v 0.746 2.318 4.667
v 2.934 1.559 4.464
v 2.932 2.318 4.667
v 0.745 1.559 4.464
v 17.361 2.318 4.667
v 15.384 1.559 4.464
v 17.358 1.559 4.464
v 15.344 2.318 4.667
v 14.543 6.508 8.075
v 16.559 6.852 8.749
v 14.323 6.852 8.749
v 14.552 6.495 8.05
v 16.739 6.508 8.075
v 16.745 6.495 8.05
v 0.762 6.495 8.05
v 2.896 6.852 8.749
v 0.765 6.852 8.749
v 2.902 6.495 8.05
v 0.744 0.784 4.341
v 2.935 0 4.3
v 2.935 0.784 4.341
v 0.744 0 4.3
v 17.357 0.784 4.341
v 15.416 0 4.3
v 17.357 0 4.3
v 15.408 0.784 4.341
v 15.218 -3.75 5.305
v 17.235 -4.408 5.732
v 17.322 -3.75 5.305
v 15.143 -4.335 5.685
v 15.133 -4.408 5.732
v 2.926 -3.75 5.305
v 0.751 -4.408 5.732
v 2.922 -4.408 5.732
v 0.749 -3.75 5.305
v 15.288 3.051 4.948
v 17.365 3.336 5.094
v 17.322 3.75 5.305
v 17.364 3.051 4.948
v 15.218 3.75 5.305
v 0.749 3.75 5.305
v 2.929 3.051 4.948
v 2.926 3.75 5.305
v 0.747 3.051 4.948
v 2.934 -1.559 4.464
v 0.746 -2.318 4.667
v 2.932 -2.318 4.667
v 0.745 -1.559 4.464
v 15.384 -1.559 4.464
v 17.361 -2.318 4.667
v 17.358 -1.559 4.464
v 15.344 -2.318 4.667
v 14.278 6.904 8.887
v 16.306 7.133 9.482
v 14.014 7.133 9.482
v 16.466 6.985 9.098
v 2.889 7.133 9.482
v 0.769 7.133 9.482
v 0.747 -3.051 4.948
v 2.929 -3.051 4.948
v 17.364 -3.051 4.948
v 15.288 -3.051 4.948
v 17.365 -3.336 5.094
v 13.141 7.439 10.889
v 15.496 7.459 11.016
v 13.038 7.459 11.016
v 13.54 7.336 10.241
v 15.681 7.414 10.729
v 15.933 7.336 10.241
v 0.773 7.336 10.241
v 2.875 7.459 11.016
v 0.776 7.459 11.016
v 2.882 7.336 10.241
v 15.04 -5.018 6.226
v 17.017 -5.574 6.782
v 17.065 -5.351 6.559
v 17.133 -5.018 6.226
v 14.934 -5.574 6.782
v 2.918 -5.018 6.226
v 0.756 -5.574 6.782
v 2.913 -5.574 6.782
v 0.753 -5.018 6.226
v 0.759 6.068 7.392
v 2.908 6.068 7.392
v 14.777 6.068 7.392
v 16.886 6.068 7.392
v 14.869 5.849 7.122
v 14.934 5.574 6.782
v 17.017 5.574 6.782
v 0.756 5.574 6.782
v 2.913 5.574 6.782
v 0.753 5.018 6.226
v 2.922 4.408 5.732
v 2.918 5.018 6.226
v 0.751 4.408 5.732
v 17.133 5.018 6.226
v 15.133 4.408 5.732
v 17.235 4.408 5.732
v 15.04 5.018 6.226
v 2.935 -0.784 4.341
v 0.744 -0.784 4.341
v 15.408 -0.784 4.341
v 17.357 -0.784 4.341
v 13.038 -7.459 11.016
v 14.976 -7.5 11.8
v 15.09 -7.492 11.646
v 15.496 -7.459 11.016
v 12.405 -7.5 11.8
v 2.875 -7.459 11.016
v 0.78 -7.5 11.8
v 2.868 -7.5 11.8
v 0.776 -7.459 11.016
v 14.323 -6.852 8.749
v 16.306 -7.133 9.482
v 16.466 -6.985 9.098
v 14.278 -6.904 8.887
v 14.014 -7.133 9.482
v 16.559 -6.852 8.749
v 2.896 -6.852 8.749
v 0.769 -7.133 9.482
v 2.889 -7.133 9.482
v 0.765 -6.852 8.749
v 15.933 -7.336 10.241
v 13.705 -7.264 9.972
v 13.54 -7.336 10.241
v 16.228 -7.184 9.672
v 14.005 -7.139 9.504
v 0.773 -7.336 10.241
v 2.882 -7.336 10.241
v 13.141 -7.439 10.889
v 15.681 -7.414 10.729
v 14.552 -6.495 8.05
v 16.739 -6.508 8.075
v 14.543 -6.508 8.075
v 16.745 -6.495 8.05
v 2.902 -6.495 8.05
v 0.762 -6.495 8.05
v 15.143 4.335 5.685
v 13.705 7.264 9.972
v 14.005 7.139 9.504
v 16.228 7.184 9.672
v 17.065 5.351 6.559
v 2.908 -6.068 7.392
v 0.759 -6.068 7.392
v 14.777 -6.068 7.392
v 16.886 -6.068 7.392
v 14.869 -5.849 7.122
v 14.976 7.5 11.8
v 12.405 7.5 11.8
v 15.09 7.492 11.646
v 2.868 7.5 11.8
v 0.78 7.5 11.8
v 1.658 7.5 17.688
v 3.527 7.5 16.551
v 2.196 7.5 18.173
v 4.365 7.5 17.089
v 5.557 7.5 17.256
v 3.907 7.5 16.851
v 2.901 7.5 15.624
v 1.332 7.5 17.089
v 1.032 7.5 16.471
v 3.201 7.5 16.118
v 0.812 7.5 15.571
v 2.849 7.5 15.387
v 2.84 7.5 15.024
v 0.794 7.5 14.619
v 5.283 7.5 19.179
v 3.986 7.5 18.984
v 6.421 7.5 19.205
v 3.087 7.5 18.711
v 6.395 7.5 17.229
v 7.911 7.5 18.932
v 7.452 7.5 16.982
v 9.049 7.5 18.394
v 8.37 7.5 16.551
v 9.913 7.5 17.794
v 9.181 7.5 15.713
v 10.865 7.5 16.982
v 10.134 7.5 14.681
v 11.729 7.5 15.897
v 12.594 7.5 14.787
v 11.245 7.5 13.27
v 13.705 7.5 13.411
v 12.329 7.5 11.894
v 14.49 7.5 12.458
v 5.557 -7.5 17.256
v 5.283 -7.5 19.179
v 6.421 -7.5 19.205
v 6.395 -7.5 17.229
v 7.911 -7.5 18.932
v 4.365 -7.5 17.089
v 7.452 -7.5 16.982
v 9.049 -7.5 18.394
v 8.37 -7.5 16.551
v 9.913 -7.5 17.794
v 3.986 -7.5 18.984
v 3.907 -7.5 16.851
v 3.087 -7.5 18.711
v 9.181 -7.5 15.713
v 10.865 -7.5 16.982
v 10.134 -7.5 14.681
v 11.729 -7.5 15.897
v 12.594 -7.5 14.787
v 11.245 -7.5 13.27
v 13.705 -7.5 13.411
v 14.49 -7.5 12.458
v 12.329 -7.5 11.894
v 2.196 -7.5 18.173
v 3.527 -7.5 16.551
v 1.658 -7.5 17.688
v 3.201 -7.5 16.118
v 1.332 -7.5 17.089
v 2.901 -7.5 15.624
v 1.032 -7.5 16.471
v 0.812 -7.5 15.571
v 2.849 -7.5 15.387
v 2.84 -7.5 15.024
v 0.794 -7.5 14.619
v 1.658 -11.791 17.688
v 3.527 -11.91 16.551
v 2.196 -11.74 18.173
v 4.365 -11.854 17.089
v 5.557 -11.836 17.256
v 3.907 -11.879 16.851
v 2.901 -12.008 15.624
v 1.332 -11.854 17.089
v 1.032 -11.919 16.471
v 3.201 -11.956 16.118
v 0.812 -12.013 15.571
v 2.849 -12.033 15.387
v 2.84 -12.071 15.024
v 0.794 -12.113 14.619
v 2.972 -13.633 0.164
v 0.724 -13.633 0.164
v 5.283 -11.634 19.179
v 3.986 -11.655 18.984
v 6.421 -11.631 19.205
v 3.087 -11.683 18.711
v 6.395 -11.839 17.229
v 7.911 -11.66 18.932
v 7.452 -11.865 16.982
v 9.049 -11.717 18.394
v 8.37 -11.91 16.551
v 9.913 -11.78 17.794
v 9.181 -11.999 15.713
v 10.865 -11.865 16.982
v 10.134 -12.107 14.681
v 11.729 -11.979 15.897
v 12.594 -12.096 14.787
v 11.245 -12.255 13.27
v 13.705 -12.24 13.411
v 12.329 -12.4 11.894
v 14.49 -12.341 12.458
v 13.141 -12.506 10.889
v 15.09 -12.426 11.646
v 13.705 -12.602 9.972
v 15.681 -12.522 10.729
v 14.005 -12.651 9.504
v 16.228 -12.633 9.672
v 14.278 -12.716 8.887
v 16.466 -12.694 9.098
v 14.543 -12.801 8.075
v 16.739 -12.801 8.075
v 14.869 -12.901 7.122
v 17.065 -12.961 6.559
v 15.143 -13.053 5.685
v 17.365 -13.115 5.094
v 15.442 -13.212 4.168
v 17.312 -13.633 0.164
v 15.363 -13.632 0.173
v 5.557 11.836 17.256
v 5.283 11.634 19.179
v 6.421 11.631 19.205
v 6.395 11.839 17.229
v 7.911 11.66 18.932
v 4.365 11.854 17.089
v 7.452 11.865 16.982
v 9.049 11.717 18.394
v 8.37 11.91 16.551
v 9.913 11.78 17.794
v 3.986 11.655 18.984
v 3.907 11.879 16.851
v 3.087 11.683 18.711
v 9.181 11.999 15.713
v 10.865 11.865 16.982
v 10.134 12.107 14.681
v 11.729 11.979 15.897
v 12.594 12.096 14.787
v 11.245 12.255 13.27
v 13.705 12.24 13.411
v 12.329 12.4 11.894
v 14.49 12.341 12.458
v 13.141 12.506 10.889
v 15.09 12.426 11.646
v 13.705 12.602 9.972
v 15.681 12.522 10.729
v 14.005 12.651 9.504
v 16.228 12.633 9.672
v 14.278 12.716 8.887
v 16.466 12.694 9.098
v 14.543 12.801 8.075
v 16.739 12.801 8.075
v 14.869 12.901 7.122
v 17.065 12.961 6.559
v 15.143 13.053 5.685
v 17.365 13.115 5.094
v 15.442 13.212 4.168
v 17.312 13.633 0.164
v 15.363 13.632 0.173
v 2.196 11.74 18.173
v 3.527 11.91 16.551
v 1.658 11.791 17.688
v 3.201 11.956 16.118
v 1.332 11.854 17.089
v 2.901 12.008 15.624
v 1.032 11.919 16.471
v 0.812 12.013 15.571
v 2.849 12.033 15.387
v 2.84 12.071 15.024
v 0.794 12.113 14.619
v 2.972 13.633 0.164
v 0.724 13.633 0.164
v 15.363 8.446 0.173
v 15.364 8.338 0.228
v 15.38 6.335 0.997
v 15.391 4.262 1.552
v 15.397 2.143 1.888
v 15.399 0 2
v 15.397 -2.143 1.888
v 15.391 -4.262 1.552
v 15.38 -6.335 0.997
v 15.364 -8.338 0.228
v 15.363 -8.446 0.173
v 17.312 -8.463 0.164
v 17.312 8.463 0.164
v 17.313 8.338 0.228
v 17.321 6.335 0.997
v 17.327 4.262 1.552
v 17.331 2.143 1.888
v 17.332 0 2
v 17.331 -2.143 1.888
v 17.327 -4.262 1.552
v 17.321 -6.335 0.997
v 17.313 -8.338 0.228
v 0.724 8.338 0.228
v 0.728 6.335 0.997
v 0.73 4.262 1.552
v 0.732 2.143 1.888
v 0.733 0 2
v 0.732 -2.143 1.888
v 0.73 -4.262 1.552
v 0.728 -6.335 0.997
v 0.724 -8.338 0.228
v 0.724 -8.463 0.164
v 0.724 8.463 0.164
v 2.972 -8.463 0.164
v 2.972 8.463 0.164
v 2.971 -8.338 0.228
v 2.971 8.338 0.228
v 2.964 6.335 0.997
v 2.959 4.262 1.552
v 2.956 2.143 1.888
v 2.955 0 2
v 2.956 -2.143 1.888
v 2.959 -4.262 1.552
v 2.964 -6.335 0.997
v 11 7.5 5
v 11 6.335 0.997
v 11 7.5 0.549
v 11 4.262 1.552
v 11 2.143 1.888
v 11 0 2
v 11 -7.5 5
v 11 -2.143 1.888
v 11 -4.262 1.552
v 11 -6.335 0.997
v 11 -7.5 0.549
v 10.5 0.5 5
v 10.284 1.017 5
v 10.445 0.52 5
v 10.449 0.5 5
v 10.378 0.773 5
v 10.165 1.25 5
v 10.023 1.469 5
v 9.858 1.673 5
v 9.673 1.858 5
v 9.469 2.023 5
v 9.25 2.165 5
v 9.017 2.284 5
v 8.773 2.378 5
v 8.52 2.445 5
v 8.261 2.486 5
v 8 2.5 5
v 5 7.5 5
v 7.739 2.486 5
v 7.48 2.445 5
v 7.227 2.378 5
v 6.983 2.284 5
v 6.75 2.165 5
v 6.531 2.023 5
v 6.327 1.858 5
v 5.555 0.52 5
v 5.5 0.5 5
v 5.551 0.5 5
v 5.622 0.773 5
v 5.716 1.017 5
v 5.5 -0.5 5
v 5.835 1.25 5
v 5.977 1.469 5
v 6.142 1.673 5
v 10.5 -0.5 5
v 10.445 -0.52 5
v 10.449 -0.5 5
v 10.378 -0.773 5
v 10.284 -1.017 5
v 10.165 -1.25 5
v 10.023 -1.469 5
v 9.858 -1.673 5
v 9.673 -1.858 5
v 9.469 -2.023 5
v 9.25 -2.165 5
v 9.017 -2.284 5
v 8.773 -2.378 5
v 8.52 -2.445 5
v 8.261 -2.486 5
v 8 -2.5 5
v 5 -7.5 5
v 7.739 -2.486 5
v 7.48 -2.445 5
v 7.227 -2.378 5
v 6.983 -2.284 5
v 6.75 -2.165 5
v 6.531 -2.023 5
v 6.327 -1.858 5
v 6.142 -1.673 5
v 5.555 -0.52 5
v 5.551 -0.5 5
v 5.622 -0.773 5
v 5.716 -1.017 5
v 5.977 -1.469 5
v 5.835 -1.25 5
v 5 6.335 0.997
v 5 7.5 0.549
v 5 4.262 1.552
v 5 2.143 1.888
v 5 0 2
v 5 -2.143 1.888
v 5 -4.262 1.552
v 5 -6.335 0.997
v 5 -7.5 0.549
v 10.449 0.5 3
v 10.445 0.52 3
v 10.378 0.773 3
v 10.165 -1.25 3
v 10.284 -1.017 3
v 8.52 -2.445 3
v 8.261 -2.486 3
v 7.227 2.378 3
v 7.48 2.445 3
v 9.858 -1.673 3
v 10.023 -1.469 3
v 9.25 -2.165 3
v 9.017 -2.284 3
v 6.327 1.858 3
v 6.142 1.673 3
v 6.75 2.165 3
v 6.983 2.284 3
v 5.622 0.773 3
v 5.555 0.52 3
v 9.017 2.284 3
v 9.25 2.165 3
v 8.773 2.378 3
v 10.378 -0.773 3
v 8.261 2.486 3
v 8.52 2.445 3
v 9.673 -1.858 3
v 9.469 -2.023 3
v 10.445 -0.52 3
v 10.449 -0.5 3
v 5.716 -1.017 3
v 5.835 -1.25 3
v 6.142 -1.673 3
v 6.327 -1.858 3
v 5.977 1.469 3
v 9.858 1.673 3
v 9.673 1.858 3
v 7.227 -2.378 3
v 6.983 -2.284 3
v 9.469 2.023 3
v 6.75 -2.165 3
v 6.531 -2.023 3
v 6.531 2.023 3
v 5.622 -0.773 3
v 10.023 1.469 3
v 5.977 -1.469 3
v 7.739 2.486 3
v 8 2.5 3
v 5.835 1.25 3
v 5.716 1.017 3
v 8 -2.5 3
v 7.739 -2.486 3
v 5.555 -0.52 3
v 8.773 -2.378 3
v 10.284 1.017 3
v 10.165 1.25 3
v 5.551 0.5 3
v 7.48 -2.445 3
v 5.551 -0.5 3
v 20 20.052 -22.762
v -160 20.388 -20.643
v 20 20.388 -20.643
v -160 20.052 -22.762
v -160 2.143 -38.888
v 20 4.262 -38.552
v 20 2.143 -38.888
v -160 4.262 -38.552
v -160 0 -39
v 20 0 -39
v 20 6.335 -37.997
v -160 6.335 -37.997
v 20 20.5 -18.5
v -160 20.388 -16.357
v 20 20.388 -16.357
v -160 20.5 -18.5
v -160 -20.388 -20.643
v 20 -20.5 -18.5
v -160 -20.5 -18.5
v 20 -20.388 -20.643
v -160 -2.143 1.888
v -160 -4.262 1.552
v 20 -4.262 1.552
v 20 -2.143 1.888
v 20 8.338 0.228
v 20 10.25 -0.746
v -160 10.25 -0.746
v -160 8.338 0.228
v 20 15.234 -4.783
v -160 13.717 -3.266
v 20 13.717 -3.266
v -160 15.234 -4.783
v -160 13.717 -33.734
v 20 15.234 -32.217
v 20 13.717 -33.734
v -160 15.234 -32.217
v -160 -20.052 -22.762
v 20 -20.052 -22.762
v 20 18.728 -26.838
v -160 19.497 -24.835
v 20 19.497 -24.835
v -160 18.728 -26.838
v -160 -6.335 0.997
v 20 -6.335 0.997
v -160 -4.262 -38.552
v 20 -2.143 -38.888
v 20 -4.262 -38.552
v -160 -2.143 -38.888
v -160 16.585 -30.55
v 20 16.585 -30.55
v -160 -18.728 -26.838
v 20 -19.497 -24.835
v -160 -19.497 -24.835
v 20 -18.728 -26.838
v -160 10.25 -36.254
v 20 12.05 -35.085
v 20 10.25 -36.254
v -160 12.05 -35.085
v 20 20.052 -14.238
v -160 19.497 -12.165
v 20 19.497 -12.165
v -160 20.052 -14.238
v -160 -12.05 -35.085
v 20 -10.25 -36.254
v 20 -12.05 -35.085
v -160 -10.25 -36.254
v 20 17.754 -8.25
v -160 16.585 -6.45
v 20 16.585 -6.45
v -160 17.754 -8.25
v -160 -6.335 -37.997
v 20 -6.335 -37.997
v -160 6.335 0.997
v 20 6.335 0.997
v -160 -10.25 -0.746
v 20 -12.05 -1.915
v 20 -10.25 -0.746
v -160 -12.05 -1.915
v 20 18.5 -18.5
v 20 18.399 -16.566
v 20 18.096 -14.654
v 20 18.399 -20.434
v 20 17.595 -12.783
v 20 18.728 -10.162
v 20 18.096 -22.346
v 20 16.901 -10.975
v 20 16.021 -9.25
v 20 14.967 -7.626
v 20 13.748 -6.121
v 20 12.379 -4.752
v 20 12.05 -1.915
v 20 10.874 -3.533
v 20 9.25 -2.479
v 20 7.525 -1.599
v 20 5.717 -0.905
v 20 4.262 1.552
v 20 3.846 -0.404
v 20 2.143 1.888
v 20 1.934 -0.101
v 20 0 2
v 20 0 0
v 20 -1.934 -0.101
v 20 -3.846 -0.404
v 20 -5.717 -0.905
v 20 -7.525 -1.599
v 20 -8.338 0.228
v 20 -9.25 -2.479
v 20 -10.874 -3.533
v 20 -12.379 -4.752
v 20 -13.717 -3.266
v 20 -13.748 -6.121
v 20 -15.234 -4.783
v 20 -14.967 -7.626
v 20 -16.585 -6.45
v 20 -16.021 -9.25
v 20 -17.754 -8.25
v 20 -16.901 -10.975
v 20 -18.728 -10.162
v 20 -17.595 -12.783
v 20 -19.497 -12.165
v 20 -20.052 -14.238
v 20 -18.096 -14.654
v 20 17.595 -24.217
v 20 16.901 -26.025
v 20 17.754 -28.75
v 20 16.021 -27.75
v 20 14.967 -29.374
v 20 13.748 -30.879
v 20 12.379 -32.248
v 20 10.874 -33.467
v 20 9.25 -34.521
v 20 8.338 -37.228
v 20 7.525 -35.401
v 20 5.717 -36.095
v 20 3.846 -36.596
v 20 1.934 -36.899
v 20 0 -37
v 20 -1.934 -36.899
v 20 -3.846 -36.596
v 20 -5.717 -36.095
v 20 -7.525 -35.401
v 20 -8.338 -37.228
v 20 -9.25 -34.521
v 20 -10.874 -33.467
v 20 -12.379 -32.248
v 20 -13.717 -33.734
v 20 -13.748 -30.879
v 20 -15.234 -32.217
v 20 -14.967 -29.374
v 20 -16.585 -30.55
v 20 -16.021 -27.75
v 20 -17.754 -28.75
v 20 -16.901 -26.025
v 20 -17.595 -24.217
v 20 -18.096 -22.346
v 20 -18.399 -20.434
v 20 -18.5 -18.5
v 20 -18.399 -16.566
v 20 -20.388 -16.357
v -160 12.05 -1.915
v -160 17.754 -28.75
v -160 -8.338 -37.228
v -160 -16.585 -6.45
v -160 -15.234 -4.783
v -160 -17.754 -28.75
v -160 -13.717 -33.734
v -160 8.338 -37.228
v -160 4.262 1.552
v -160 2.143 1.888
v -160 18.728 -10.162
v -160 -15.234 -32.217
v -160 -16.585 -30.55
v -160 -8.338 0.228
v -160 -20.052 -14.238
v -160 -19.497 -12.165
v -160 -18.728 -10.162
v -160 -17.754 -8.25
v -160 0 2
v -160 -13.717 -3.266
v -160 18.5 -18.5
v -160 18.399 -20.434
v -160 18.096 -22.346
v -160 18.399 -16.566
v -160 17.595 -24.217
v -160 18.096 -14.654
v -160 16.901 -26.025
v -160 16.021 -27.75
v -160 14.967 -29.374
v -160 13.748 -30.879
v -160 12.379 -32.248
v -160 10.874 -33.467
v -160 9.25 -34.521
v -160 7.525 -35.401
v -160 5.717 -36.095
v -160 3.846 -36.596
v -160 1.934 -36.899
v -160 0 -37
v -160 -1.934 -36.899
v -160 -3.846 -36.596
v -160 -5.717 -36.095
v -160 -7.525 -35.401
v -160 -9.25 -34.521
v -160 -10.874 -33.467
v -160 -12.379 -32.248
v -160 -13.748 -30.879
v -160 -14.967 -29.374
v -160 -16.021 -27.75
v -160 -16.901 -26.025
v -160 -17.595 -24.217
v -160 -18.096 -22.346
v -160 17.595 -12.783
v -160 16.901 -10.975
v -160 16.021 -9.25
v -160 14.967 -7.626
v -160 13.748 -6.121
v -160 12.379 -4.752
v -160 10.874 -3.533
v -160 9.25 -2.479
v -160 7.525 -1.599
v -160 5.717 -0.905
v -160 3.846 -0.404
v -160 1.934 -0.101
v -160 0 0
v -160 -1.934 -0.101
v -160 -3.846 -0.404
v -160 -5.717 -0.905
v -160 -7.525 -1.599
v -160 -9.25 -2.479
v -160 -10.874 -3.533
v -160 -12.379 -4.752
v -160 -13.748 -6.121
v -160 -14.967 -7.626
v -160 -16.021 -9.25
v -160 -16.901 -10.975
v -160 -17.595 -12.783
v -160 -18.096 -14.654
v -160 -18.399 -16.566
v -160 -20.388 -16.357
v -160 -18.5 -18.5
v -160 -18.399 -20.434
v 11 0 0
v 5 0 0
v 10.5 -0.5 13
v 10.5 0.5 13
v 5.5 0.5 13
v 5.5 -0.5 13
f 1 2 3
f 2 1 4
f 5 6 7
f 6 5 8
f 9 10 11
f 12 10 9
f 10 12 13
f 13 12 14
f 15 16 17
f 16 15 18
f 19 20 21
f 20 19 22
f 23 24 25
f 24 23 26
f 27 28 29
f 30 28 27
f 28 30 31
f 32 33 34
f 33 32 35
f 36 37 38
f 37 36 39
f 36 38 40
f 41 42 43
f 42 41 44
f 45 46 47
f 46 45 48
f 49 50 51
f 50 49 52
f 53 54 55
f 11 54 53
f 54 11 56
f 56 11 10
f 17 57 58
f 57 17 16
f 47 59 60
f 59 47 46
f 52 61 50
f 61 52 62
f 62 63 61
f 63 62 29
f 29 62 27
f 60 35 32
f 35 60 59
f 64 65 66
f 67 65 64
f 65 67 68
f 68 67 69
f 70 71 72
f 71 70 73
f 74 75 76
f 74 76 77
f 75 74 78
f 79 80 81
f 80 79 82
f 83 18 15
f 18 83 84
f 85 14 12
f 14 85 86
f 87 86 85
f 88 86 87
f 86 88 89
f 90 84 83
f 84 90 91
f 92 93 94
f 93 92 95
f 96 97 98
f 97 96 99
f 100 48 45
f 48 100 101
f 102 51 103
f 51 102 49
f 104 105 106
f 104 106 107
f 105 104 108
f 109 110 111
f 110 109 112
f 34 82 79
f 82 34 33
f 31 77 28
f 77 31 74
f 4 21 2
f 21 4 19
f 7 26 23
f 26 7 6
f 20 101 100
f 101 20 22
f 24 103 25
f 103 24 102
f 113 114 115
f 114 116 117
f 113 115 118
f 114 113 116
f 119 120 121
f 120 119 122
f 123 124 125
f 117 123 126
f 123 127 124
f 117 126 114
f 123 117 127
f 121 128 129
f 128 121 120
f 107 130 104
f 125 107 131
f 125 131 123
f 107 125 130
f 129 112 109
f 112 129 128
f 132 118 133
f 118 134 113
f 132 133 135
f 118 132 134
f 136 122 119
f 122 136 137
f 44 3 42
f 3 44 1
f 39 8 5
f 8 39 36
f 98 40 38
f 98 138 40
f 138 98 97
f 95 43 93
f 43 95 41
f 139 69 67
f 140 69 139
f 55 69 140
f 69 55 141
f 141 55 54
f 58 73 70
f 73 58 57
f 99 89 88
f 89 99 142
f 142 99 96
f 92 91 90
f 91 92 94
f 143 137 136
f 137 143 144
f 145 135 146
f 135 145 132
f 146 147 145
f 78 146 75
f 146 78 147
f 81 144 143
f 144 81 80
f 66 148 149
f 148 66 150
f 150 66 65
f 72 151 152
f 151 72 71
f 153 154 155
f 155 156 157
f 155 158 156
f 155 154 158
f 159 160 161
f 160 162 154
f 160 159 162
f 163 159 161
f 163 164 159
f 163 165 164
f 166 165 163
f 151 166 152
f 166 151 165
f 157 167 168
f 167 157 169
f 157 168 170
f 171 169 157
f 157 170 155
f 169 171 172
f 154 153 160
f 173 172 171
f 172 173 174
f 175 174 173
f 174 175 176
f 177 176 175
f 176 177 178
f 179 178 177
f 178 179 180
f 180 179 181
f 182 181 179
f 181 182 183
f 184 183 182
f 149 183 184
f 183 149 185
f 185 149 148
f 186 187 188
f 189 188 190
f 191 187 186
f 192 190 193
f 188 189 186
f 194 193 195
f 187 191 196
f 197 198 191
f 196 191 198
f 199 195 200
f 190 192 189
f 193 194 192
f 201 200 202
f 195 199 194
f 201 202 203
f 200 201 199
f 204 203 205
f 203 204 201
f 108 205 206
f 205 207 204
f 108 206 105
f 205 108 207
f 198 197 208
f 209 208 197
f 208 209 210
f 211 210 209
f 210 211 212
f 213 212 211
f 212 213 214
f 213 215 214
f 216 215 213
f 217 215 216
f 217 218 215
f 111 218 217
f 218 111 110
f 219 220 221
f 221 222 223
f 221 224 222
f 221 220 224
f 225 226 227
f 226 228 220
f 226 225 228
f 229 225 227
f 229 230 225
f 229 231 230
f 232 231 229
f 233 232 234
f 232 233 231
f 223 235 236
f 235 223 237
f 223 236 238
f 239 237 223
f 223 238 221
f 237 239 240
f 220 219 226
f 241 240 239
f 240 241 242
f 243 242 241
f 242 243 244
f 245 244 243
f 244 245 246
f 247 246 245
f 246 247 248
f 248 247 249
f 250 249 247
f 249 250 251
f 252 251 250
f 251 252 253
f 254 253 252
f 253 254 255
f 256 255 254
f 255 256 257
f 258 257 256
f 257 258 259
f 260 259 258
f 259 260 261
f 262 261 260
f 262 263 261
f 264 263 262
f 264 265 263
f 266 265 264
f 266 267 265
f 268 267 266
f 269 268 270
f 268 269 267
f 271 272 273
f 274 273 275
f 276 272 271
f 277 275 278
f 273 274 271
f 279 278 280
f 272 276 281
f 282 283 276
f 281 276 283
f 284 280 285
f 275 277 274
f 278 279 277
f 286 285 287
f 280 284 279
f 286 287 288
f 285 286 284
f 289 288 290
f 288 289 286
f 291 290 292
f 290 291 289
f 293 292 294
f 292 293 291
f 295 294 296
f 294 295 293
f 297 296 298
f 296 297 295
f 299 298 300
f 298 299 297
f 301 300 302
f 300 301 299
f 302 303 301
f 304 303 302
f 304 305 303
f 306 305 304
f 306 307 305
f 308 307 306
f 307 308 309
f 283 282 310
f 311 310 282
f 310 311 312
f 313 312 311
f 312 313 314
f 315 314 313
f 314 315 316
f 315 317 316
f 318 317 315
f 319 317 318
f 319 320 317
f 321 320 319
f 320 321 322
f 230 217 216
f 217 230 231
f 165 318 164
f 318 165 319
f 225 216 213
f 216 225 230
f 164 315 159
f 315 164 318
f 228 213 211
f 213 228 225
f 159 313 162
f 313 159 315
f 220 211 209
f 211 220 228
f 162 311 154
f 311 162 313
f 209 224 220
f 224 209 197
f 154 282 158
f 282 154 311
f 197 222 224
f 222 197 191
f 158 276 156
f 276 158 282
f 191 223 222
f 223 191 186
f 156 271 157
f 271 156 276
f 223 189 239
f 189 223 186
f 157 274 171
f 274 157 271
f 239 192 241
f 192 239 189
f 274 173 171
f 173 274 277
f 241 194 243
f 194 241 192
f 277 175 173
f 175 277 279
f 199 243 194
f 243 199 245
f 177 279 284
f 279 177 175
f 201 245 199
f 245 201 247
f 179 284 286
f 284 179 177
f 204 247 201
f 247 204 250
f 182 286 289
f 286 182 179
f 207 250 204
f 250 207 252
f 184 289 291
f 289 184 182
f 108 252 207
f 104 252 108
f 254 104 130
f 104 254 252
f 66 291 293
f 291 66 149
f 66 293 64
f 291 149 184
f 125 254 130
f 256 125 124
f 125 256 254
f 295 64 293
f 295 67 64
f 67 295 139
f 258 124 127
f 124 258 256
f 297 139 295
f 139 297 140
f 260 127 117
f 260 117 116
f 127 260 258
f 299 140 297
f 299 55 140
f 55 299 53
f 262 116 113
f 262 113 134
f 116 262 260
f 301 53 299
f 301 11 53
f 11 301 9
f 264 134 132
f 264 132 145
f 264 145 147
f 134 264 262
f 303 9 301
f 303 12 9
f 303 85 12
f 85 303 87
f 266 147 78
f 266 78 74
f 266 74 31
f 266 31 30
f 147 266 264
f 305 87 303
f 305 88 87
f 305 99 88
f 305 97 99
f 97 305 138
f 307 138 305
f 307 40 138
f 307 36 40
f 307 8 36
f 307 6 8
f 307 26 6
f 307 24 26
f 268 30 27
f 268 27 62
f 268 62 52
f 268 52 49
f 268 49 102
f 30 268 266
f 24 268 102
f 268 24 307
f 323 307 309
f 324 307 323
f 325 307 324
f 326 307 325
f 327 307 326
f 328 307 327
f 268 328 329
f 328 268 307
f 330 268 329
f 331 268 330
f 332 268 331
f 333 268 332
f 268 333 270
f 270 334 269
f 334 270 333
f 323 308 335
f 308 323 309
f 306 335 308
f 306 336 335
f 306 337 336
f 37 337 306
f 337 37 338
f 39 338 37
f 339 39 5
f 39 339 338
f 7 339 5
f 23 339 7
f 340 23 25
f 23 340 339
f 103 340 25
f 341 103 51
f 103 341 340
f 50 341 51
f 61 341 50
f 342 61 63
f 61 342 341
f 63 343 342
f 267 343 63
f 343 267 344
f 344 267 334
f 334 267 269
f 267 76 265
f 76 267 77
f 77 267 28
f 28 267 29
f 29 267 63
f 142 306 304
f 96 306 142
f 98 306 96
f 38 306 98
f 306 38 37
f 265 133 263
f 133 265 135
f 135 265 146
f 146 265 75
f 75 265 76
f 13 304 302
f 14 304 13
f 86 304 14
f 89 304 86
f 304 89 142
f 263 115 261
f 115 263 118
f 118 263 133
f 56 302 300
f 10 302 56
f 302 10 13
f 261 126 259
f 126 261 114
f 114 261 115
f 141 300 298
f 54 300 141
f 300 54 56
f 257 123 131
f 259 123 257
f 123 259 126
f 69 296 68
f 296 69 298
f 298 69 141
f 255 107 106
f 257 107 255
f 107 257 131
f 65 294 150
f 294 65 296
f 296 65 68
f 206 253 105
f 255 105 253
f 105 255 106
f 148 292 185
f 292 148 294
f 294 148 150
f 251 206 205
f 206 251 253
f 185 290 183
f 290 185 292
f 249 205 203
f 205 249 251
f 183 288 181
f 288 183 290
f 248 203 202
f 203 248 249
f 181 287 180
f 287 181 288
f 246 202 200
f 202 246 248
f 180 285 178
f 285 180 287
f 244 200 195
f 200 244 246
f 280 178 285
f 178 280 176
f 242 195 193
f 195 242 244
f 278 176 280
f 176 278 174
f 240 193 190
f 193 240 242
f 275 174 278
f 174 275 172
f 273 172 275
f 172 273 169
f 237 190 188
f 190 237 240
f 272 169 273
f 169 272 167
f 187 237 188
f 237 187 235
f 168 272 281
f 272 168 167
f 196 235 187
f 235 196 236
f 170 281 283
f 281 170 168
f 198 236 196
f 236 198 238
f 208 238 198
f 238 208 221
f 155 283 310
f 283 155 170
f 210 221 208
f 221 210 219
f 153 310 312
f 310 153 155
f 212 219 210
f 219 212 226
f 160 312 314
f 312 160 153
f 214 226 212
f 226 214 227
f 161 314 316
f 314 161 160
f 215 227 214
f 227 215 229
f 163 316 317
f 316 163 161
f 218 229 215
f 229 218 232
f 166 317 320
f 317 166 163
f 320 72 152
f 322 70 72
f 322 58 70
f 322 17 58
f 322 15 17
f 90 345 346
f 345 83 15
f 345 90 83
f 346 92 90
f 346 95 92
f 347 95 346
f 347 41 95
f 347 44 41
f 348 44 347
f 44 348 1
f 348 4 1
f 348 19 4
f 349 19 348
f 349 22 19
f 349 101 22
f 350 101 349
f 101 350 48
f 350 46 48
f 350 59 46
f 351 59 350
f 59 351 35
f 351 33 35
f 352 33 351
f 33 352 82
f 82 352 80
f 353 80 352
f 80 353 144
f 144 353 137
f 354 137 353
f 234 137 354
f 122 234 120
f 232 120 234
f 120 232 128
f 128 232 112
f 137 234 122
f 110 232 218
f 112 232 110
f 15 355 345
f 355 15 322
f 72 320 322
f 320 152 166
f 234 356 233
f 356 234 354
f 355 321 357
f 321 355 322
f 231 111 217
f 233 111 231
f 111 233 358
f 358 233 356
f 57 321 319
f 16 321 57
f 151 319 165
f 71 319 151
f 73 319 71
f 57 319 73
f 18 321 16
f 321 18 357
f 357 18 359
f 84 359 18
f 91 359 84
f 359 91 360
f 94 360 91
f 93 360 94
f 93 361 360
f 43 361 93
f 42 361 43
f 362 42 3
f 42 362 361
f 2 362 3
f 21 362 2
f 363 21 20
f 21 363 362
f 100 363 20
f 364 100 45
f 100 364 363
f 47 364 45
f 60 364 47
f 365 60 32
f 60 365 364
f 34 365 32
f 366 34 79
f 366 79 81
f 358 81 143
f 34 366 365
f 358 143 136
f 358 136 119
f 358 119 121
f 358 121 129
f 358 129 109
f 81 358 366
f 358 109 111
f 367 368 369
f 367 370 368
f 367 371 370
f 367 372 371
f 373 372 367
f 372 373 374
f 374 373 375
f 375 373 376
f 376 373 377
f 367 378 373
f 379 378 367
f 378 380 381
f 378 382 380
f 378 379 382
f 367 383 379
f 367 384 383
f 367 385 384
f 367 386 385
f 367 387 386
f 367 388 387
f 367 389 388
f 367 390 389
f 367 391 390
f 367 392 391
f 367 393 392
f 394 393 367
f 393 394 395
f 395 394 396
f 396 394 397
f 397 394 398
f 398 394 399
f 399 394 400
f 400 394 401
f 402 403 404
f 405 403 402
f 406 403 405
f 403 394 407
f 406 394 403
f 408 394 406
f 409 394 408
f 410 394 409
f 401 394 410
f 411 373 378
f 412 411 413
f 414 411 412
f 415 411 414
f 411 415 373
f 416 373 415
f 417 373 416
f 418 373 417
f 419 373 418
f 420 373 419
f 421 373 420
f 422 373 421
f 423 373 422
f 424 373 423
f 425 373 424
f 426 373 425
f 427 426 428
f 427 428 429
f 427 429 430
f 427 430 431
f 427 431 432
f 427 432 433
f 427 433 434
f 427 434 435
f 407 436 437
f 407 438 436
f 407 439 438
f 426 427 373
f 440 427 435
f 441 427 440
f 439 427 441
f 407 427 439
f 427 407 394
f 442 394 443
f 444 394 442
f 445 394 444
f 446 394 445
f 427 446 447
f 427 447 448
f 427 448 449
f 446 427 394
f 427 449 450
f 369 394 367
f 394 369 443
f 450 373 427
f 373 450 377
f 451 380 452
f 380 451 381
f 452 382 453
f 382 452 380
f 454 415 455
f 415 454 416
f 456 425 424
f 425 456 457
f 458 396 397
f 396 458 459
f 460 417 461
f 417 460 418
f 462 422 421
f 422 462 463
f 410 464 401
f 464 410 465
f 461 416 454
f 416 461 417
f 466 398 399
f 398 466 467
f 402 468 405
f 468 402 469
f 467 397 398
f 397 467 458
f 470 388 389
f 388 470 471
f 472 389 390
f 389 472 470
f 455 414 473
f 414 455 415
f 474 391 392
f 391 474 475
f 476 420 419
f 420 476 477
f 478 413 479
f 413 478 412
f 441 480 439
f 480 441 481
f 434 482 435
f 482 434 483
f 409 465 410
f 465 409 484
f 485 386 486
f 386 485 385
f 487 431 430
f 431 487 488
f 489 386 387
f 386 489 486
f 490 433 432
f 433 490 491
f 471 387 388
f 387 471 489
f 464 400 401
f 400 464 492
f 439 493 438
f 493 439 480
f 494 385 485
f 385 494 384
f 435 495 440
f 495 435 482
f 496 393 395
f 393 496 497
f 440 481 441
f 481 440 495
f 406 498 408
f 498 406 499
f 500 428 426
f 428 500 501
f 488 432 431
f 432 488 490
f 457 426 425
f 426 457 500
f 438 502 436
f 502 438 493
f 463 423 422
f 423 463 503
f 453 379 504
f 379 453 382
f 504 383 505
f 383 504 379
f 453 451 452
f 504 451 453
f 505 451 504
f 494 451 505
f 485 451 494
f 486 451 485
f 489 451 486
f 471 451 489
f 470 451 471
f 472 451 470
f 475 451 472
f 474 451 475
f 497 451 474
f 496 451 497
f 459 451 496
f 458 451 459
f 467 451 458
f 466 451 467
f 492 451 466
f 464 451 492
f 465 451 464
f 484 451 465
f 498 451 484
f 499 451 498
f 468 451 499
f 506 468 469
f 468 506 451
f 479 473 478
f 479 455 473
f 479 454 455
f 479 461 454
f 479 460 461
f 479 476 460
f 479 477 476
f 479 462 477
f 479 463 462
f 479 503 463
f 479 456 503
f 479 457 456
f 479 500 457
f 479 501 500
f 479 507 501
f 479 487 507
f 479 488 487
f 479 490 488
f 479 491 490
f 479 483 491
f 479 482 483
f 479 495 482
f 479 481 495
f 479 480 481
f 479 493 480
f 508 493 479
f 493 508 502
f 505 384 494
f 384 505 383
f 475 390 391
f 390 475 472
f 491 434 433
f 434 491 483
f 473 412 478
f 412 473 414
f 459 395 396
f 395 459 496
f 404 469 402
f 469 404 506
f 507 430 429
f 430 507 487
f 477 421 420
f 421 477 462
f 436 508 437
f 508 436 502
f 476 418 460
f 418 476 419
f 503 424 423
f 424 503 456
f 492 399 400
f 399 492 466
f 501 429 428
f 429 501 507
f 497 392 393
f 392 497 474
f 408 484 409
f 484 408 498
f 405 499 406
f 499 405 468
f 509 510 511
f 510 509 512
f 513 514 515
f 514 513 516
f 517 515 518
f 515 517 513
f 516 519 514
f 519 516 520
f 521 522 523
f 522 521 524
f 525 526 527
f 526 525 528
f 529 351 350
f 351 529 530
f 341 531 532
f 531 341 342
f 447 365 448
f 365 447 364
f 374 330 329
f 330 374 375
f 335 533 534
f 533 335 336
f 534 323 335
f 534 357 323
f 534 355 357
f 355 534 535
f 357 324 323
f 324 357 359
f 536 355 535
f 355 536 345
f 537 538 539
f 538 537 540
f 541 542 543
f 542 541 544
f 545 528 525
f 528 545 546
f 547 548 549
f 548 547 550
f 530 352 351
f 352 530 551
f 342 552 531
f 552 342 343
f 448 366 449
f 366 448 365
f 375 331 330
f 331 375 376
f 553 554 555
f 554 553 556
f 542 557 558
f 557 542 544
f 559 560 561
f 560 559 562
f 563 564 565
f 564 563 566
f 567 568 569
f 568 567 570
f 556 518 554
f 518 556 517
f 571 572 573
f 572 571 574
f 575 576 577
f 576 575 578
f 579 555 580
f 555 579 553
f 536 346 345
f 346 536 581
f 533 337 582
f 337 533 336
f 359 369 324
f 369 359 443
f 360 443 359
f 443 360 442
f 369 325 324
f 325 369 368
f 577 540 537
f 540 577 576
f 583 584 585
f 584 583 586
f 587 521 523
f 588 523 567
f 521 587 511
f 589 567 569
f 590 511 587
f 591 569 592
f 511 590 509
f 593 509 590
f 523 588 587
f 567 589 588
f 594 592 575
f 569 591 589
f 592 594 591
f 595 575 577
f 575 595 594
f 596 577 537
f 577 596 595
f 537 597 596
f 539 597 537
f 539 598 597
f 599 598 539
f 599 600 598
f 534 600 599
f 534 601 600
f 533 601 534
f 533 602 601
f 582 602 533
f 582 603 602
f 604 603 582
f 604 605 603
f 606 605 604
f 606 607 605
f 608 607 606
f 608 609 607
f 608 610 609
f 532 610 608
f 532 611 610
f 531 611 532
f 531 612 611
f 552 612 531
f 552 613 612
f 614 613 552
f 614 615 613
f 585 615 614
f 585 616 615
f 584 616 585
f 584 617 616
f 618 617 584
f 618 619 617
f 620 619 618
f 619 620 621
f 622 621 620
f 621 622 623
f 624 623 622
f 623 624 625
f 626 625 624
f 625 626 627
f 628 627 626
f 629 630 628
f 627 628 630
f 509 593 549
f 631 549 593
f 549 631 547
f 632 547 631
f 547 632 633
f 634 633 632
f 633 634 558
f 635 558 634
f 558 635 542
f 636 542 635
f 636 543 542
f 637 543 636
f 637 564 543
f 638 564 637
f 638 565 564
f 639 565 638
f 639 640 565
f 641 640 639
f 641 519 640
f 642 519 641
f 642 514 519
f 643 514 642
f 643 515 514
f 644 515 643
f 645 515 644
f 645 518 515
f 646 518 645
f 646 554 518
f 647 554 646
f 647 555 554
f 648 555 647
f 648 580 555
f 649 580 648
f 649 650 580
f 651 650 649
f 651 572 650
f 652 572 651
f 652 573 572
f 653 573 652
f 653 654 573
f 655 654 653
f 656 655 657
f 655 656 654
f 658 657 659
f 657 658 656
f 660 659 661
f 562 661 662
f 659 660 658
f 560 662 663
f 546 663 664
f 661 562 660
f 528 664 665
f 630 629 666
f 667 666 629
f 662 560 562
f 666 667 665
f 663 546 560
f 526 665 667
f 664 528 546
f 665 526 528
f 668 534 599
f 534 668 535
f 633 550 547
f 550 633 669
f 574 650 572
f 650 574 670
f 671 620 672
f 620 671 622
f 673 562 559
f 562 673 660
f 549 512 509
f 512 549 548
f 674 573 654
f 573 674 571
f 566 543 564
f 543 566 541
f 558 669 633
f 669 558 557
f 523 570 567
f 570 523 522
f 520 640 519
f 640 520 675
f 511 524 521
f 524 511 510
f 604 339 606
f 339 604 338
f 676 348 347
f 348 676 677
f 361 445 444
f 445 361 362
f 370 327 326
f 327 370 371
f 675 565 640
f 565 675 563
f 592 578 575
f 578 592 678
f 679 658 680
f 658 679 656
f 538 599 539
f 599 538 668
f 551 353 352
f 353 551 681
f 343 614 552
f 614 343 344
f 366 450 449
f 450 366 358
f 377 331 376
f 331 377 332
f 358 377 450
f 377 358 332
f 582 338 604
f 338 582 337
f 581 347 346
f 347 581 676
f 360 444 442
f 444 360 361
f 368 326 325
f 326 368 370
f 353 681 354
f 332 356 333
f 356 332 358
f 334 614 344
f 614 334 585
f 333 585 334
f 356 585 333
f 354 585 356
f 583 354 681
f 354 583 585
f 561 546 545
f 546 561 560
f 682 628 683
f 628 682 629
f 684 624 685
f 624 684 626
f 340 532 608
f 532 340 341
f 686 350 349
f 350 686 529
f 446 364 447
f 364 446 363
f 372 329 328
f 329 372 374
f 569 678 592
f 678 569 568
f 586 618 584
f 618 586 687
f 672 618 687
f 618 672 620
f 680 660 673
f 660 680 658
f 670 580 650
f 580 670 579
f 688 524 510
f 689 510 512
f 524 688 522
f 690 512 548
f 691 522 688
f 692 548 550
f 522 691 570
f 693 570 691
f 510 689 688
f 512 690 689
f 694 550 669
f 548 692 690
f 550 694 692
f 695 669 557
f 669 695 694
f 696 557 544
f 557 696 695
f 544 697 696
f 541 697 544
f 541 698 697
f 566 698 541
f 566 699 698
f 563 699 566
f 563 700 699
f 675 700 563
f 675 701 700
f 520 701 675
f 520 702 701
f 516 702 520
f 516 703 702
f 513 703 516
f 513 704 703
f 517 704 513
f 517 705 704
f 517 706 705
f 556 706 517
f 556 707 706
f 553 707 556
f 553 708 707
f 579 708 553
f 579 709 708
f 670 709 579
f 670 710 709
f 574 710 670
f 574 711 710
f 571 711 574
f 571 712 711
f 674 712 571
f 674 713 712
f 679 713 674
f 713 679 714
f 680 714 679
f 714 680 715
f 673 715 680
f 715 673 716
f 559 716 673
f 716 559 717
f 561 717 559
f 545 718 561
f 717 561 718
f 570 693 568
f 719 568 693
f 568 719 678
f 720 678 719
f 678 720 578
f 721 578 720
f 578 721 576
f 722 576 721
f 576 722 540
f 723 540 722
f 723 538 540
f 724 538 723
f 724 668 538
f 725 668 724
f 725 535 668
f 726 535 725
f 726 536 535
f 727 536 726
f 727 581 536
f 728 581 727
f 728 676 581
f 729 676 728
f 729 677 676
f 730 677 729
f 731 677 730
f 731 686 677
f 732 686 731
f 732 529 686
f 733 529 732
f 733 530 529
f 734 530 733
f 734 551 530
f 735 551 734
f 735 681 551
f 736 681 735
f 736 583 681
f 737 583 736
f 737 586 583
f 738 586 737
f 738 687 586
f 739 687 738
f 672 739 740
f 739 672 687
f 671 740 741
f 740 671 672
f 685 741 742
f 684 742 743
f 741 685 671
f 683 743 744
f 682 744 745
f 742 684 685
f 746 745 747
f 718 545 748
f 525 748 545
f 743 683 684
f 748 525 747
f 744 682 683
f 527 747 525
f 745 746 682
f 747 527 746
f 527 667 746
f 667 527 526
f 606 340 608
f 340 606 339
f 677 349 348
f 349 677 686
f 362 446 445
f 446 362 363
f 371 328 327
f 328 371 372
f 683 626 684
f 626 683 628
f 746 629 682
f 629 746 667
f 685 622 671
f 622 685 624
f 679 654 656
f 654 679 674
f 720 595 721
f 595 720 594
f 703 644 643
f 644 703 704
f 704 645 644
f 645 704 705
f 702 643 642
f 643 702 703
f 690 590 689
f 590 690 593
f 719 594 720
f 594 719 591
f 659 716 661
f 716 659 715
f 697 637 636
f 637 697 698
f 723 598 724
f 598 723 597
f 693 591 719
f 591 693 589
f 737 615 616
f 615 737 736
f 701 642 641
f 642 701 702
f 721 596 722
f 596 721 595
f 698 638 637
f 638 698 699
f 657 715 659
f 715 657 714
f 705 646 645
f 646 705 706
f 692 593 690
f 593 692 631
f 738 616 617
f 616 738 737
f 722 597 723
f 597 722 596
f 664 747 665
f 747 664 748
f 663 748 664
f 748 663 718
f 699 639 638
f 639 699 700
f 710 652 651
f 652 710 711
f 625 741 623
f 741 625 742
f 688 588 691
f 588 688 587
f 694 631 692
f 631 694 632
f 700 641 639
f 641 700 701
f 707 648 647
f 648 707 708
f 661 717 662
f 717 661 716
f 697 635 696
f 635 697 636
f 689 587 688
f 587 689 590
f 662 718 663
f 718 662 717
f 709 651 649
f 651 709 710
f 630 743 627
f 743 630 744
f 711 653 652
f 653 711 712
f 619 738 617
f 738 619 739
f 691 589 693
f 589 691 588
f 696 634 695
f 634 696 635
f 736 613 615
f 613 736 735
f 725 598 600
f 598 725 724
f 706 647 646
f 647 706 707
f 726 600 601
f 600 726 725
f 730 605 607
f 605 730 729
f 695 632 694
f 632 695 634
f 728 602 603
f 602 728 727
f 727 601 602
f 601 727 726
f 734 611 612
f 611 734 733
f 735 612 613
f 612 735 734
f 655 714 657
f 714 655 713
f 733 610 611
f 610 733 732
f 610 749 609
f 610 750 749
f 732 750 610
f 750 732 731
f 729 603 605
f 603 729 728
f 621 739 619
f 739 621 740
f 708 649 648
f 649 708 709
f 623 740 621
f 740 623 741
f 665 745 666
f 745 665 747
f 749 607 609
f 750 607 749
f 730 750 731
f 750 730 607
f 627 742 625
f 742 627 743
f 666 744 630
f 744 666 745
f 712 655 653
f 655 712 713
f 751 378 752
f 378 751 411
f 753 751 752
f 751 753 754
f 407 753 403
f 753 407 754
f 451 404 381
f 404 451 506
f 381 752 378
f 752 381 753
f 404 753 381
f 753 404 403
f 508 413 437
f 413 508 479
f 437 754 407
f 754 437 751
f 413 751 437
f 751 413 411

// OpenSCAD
resolution=60;

difference(){				// Sight guard
	translate([0,29.3/2,0])
		rotate([90,0,0])
			linear_extrude(height = 29.3) 
				import("sight-profile-1.dxf");  // MIGHT be 37
	union(){
		translate([-5,0,11.8])  
			rotate([0,90,0])  
				color("blue")	cylinder(r=15/2 , h=30, $fn=resolution);
		translate([-5,-15/2,11.8])	
			color("purple")		cube([30,15,15]);
			
	
		translate([-5,-29.3/2+1,0])
			rotate([-6,0,0])		translate([0,-30,0])
				color("green")	cube([30,30,30]);

		translate([-5,29.3/2-1,0])
			rotate([6,0,0])
				color("red") cube([30,30,30]);
	}	//end union
}	  //end difference

difference()	{				// Sight block
	translate([5,-15/2,0])
		color("brown")	cube([6,15,5]);

	translate([5+0.5+5/2,0,3])
		color("black")	cylinder(h=4, r=5/2, $fn=resolution);
}	// end difference 		(sight)


translate([5+0.5,-0.5,2])	// Sight Pin
	color("orange")		cube([5,1,11]);


// Barrel from main project
barrel_outer_d=35;
ring_inner_r=(barrel_outer_d+2)/2;
ring_outer_r=ring_inner_r+2;
barrel_length=180; 
inset_height=0;
barrel_outer_r=ring_outer_r;  
echo( "barrel_outer_r" , barrel_outer_r);

translate([20-barrel_length, 0,-barrel_outer_r + 2 ])
	rotate([0,90,0])
		difference()	{
			cylinder(h = barrel_length-inset_height, r=barrel_outer_r, $fn=resolution);
			translate([0,0,-5])
				cylinder(h = barrel_length*2, r=ring_outer_r-2, $fn=resolution);
	}
